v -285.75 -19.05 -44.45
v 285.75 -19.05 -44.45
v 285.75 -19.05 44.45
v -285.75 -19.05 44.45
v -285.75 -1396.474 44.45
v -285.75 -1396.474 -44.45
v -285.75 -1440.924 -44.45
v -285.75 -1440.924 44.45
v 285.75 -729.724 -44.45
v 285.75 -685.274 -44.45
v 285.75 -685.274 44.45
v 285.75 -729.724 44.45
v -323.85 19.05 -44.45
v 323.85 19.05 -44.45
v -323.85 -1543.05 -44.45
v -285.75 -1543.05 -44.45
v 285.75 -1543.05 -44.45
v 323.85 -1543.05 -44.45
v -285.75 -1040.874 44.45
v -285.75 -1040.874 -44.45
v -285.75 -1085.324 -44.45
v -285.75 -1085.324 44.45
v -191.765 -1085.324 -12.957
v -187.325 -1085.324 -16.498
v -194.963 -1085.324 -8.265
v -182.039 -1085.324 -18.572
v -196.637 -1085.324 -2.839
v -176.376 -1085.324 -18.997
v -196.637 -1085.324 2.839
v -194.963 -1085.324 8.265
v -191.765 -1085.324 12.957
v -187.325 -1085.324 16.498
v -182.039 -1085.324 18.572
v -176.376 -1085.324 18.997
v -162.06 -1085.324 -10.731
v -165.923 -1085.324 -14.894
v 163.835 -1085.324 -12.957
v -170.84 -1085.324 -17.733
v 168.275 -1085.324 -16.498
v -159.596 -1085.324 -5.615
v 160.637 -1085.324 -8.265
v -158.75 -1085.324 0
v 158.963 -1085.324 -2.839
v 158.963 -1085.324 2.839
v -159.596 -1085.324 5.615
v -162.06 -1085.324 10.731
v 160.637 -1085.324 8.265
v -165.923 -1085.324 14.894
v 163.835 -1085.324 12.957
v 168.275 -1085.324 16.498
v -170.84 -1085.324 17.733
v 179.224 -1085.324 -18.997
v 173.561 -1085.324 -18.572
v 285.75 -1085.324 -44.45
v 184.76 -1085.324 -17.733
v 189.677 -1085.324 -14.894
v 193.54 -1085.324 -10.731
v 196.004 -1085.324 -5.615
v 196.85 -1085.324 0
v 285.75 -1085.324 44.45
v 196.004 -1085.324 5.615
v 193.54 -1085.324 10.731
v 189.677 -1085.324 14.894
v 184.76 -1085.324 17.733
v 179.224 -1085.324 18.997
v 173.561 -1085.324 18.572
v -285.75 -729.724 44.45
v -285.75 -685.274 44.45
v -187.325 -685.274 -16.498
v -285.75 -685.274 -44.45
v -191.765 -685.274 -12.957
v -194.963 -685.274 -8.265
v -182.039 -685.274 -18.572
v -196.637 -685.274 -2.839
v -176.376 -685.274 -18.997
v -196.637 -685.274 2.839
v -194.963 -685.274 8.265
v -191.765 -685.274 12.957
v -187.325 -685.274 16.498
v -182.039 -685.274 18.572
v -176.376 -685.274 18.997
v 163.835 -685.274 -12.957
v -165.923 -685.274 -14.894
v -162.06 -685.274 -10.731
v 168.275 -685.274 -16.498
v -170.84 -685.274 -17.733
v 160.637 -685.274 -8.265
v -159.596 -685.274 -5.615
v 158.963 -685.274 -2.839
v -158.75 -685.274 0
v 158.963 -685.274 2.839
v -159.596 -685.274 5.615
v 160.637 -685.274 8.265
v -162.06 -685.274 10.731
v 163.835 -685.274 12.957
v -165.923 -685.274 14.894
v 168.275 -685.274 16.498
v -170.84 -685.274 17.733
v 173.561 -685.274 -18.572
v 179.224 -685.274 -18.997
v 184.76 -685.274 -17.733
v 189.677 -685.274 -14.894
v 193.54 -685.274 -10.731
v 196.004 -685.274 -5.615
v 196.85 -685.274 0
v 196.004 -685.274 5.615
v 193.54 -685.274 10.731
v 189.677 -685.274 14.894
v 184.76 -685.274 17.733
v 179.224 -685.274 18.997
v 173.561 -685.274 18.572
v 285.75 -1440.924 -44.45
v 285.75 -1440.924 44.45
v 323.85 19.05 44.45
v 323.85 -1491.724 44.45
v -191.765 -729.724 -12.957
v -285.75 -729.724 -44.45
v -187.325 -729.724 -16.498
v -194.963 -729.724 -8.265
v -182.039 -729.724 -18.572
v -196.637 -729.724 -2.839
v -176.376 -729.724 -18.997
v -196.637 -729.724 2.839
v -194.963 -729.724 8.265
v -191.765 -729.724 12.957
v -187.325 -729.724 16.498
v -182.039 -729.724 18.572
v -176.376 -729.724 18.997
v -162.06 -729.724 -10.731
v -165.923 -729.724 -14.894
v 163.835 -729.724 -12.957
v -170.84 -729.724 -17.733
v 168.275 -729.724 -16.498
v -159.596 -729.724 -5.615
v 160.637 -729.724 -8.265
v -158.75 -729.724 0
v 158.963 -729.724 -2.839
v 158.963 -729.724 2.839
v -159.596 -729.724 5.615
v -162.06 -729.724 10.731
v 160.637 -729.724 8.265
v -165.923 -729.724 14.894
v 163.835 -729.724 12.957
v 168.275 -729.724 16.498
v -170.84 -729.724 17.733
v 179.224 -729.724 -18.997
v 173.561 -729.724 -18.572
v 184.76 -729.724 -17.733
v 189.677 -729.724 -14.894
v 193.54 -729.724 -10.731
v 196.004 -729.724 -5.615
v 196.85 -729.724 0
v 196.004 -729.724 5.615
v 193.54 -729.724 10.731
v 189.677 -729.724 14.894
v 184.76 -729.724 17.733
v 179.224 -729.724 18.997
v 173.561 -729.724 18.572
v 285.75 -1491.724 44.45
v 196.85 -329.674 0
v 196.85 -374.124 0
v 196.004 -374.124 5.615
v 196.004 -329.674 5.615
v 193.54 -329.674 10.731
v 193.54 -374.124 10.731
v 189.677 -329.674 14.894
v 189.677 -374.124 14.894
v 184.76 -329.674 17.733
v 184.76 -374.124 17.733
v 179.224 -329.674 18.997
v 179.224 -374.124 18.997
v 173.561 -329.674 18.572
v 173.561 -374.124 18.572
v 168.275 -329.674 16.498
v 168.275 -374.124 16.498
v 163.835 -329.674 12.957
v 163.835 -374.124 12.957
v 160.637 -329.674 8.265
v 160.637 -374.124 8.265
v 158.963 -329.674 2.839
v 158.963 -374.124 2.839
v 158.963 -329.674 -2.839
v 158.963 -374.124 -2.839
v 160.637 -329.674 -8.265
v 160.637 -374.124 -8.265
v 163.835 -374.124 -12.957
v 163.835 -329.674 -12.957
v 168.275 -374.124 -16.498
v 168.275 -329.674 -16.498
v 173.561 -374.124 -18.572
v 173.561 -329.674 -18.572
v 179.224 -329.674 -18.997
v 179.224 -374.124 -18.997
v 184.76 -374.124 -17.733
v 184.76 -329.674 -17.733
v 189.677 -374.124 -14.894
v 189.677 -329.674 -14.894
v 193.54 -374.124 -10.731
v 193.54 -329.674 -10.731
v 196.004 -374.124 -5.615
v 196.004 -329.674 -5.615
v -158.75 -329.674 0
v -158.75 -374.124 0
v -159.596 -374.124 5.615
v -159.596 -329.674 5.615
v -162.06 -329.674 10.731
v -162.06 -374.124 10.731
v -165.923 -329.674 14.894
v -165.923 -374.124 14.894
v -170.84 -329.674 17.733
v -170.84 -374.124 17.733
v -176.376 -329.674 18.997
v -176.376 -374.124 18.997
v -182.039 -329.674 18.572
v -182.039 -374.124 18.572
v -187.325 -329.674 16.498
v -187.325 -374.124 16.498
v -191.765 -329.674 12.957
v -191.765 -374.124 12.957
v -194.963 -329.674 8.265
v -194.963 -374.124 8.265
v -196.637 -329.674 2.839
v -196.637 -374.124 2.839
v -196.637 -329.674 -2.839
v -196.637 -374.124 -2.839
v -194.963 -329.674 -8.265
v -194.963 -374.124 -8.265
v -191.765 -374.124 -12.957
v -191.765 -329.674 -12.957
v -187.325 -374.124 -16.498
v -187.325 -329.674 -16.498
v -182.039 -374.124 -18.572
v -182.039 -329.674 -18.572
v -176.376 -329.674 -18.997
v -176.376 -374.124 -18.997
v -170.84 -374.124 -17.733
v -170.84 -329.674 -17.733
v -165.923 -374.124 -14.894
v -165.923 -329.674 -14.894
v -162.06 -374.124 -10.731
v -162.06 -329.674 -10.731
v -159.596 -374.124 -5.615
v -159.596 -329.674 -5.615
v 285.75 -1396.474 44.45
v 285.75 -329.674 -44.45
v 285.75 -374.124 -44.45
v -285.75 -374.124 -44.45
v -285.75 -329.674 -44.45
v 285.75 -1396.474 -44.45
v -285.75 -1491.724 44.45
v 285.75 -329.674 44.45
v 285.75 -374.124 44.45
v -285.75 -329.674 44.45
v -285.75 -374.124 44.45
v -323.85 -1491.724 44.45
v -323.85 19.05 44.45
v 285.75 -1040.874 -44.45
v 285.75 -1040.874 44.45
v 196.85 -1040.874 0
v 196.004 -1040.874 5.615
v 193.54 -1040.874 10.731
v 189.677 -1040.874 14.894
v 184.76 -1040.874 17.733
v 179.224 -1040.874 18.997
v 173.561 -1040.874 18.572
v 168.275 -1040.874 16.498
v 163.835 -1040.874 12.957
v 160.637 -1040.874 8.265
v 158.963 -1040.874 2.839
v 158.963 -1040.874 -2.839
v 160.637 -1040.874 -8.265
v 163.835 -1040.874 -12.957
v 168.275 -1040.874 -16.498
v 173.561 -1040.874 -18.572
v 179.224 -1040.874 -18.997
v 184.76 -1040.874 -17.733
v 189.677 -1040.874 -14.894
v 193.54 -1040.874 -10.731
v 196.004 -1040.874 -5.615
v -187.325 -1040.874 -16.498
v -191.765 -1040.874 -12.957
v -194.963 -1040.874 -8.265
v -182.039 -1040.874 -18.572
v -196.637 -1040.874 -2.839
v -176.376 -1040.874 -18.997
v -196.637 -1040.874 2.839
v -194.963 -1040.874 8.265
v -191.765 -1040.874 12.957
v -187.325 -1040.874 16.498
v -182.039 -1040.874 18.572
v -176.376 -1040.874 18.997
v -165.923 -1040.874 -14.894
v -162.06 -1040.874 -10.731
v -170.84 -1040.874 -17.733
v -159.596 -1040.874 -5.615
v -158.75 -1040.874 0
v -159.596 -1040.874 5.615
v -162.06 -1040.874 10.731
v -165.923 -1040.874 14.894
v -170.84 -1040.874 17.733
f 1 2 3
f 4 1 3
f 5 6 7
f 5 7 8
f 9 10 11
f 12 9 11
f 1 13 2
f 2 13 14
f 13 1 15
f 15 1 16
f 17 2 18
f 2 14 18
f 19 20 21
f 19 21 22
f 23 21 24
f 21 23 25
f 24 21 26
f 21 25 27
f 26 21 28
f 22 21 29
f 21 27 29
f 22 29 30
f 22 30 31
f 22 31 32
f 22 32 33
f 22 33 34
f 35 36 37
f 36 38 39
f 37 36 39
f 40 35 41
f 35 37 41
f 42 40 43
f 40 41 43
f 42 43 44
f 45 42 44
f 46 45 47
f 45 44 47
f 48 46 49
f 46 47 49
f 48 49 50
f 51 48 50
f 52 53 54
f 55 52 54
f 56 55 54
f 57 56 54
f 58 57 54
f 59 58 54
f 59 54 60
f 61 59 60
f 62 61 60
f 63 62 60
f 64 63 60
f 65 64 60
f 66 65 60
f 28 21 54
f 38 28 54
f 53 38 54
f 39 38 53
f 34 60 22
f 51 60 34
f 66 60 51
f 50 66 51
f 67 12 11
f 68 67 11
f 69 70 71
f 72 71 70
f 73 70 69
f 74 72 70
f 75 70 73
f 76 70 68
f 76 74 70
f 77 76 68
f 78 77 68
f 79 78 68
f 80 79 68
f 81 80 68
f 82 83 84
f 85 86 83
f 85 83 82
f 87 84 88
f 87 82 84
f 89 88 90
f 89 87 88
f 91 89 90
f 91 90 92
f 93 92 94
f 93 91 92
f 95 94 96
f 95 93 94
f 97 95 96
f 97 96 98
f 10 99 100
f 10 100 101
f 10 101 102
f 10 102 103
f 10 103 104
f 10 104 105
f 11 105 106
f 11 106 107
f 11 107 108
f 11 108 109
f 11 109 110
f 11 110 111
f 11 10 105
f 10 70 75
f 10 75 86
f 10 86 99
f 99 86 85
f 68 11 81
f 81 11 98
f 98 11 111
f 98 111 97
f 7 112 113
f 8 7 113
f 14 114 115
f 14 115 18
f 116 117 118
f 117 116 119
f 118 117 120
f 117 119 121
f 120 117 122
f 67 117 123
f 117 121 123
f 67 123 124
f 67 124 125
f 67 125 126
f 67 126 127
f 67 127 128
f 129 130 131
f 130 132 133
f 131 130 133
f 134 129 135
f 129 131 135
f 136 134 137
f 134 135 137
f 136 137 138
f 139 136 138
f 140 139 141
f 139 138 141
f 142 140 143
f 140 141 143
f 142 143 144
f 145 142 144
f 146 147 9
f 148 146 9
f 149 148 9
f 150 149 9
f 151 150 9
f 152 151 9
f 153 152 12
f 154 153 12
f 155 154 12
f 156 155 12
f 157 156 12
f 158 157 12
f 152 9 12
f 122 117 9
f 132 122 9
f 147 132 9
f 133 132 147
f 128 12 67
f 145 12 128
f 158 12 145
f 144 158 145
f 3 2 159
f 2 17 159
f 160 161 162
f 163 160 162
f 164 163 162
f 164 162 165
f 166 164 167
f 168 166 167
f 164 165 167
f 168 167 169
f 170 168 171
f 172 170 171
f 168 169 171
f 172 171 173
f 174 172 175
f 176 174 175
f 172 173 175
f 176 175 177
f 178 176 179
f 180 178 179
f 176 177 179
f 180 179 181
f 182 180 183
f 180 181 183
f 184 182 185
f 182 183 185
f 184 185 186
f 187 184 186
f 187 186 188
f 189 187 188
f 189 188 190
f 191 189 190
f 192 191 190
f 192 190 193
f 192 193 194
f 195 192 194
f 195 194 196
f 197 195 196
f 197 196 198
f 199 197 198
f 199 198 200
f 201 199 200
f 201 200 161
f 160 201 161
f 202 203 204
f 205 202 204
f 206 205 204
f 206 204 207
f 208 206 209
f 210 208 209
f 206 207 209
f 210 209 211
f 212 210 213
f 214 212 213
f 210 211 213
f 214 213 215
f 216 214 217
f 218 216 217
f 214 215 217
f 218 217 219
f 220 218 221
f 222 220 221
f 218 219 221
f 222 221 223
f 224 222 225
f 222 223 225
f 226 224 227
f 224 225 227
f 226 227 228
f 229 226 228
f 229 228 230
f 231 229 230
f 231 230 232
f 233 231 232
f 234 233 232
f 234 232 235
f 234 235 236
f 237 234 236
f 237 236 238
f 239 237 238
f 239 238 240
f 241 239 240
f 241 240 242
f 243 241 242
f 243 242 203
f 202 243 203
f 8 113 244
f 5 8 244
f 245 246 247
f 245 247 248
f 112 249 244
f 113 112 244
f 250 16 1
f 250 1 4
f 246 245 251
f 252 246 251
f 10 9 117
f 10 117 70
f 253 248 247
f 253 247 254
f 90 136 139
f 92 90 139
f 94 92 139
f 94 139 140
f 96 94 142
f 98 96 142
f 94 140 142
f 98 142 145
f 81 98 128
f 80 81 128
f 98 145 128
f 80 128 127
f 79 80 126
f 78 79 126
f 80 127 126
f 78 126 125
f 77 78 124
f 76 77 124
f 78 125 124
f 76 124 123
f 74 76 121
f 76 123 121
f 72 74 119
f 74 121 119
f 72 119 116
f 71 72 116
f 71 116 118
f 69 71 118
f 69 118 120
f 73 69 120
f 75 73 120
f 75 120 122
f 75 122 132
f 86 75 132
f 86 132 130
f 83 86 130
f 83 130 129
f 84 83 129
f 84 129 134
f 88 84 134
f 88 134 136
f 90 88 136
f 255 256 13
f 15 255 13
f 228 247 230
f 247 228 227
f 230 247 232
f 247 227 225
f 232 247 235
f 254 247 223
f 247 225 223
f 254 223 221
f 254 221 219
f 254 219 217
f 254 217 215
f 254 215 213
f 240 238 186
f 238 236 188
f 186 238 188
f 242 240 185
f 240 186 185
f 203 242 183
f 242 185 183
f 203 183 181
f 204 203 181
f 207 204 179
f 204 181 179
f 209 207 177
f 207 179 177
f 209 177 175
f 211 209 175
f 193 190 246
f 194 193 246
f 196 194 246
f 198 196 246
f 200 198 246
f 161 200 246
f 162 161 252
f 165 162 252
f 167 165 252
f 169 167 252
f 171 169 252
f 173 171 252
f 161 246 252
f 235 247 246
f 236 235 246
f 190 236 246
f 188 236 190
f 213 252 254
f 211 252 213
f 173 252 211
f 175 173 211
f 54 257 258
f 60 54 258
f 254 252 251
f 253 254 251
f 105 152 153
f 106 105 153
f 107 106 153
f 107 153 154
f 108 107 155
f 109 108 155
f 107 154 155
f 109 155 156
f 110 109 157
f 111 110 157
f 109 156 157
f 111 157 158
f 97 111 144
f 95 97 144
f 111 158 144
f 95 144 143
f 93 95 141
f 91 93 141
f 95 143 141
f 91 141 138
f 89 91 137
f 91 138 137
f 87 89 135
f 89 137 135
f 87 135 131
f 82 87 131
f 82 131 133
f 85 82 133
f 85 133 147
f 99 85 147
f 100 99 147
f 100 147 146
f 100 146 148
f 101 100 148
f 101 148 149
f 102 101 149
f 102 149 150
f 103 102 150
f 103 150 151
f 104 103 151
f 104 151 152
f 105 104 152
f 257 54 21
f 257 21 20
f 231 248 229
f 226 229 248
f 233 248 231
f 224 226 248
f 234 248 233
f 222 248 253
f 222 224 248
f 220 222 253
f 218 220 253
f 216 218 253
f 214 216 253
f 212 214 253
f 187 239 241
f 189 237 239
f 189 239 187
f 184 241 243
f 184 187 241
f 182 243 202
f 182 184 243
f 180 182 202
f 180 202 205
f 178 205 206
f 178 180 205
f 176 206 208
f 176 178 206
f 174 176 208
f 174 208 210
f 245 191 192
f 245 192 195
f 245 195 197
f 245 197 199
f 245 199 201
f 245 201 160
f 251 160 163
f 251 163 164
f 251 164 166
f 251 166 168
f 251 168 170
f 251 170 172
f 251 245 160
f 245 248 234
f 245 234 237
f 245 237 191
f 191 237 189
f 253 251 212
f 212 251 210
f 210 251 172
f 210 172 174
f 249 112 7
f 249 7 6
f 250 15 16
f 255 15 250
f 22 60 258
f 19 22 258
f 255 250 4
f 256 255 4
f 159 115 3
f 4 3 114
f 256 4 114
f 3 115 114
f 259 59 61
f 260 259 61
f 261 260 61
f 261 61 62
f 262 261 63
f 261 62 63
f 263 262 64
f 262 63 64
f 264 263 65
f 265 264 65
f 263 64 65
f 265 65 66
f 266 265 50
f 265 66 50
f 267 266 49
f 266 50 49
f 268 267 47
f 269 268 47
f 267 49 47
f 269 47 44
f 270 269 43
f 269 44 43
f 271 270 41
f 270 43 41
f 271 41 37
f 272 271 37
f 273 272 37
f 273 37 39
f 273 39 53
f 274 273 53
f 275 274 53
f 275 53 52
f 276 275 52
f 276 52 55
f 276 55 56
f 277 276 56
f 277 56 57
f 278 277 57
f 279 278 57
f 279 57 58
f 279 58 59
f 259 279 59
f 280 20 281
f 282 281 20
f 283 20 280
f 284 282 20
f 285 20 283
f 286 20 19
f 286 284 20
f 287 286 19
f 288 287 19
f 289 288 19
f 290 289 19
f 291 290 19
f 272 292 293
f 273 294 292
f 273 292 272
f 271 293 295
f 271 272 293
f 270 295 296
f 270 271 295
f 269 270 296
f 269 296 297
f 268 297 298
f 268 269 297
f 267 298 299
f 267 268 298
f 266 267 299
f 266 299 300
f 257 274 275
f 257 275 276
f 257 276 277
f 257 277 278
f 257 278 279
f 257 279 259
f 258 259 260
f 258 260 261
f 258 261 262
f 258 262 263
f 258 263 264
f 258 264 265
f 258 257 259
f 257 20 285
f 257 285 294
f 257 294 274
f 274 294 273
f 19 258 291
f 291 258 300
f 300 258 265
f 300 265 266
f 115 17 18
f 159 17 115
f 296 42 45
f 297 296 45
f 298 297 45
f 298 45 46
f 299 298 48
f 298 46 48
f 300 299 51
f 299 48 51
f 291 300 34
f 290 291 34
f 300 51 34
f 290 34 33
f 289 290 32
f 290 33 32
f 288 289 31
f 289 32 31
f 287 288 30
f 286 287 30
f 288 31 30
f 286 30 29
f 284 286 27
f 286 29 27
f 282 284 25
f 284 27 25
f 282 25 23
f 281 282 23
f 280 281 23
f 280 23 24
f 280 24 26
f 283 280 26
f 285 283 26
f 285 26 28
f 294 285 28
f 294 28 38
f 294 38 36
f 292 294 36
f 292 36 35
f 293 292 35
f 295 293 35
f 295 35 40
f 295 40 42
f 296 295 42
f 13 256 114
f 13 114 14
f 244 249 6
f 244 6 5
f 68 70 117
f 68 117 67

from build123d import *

# Parameters (mm, degrees)
SKETCH3_W               = 38.1
SKETCH3_H               = 88.9
SKETCH10_W              = 571.5
SKETCH10_H              = 183.393381717
CUT_EXTRUDE6_DEPTH      = 1580.172357597
CUT_EXTRUDE7_DEPTH      = 1675.065230211
CUT_EXTRUDE7_DEPTH_BACK = 1675.065230211
SKETCH11_W              = 88.9
SKETCH11_H              = 44.45
BOSS_EXTRUDE1_DEPTH     = 571.5
LPATTERN1_COUNT         = 4
LPATTERN1_PITCH         = 355.6
SKETCH12_R              = 19.05
CUT_EXTRUDE8_DEPTH      = 990.6


with BuildPart() as part:
    # Sweep1: sweep along a path in Sketch2
    with BuildLine(Plane.XY) as sweep1_path:
        Line((-304.8, 0), (304.8, 0))
        Line((304.8, 0), (304.8, -1524))
        Line((304.8, -1524), (-304.8, -1524))
        Line((-304.8, -1524), (-304.8, 0))
    # Sketch3 → Sweep1 (sweep)
    with BuildSketch(Plane(origin=(0, 0, 0), x_dir=(1, 0, 0), z_dir=(0, 1, 0))):
        with Locations((304.8, 0)):
            Rectangle(SKETCH3_W, SKETCH3_H)
    sweep(path=sweep1_path.line, transition=Transition.RIGHT)

    # Sketch10 → Cut-Extrude6 (cut, through all)
    with BuildSketch(Plane.XY.offset(44.45)):
        with Locations((0, -1561.428423028)):
            Rectangle(SKETCH10_W, SKETCH10_H)
    extrude(amount=-CUT_EXTRUDE6_DEPTH, mode=Mode.SUBTRACT)

    # Sketch9 → Cut-Extrude7 (cut, two sides: drawn at the far end of the back side and taken through both)
    with BuildSketch(Plane(origin=(323.85, 0, 0), x_dir=(0, 0, -1), z_dir=(1, 0, 0)).offset(-CUT_EXTRUDE7_DEPTH_BACK)):
        Polygon((2763.124803814, -3112.677629821), (44.45, -1543.05), (-44.45, -1491.723561069), (-2763.124803814, 77.904068752), (-5902.380063457, -5359.445538876), (-376.130455828, -8550.02723745), align=None)
    extrude(amount=CUT_EXTRUDE7_DEPTH + CUT_EXTRUDE7_DEPTH_BACK, mode=Mode.SUBTRACT)


with BuildPart() as body_2:
    # Sketch11 → Boss-Extrude1 (new body)
    with BuildSketch(Plane.ZY.offset(-285.75)):
        with Locations((0, -1418.698561069)):
            Rectangle(SKETCH11_W, SKETCH11_H)
    boss_extrude1 = extrude(amount=BOSS_EXTRUDE1_DEPTH)


with BuildPart() as lpattern1_1:
    # LPattern1: pattern copy
    add(boss_extrude1.moved(Location(Vector(0, 1, 0) * (1 * LPATTERN1_PITCH))))


with BuildPart() as lpattern1_2:
    # LPattern1: pattern copy
    add(boss_extrude1.moved(Location(Vector(0, 1, 0) * (2 * LPATTERN1_PITCH))))


with BuildPart() as lpattern1_3:
    # LPattern1: pattern copy
    add(boss_extrude1.moved(Location(Vector(0, 1, 0) * (3 * LPATTERN1_PITCH))))


with BuildPart() as cut_extrude8_tool:
    # Sketch12 → Cut-Extrude8 (new body)
    with BuildSketch(Plane.XZ.offset(1085.323561069)):
        with Locations((177.8, 0)):
            Circle(SKETCH12_R)
        with Locations((-177.8, 0)):
            Circle(SKETCH12_R)
    extrude(amount=-CUT_EXTRUDE8_DEPTH)


with BuildPart() as lpattern1_1_1:
    add(lpattern1_1.part)

    # Cut-Extrude8: cut by cut_extrude8_tool
    add(cut_extrude8_tool.part, mode=Mode.SUBTRACT)


with BuildPart() as lpattern1_2_1:
    add(lpattern1_2.part)

    # Cut-Extrude8: cut by cut_extrude8_tool
    add(cut_extrude8_tool.part, mode=Mode.SUBTRACT)


with BuildPart() as lpattern1_3_1:
    add(lpattern1_3.part)

    # Cut-Extrude8: cut by cut_extrude8_tool
    add(cut_extrude8_tool.part, mode=Mode.SUBTRACT)


solid = Compound([part.part, body_2.part, lpattern1_1_1.part, lpattern1_2_1.part, lpattern1_3_1.part])
